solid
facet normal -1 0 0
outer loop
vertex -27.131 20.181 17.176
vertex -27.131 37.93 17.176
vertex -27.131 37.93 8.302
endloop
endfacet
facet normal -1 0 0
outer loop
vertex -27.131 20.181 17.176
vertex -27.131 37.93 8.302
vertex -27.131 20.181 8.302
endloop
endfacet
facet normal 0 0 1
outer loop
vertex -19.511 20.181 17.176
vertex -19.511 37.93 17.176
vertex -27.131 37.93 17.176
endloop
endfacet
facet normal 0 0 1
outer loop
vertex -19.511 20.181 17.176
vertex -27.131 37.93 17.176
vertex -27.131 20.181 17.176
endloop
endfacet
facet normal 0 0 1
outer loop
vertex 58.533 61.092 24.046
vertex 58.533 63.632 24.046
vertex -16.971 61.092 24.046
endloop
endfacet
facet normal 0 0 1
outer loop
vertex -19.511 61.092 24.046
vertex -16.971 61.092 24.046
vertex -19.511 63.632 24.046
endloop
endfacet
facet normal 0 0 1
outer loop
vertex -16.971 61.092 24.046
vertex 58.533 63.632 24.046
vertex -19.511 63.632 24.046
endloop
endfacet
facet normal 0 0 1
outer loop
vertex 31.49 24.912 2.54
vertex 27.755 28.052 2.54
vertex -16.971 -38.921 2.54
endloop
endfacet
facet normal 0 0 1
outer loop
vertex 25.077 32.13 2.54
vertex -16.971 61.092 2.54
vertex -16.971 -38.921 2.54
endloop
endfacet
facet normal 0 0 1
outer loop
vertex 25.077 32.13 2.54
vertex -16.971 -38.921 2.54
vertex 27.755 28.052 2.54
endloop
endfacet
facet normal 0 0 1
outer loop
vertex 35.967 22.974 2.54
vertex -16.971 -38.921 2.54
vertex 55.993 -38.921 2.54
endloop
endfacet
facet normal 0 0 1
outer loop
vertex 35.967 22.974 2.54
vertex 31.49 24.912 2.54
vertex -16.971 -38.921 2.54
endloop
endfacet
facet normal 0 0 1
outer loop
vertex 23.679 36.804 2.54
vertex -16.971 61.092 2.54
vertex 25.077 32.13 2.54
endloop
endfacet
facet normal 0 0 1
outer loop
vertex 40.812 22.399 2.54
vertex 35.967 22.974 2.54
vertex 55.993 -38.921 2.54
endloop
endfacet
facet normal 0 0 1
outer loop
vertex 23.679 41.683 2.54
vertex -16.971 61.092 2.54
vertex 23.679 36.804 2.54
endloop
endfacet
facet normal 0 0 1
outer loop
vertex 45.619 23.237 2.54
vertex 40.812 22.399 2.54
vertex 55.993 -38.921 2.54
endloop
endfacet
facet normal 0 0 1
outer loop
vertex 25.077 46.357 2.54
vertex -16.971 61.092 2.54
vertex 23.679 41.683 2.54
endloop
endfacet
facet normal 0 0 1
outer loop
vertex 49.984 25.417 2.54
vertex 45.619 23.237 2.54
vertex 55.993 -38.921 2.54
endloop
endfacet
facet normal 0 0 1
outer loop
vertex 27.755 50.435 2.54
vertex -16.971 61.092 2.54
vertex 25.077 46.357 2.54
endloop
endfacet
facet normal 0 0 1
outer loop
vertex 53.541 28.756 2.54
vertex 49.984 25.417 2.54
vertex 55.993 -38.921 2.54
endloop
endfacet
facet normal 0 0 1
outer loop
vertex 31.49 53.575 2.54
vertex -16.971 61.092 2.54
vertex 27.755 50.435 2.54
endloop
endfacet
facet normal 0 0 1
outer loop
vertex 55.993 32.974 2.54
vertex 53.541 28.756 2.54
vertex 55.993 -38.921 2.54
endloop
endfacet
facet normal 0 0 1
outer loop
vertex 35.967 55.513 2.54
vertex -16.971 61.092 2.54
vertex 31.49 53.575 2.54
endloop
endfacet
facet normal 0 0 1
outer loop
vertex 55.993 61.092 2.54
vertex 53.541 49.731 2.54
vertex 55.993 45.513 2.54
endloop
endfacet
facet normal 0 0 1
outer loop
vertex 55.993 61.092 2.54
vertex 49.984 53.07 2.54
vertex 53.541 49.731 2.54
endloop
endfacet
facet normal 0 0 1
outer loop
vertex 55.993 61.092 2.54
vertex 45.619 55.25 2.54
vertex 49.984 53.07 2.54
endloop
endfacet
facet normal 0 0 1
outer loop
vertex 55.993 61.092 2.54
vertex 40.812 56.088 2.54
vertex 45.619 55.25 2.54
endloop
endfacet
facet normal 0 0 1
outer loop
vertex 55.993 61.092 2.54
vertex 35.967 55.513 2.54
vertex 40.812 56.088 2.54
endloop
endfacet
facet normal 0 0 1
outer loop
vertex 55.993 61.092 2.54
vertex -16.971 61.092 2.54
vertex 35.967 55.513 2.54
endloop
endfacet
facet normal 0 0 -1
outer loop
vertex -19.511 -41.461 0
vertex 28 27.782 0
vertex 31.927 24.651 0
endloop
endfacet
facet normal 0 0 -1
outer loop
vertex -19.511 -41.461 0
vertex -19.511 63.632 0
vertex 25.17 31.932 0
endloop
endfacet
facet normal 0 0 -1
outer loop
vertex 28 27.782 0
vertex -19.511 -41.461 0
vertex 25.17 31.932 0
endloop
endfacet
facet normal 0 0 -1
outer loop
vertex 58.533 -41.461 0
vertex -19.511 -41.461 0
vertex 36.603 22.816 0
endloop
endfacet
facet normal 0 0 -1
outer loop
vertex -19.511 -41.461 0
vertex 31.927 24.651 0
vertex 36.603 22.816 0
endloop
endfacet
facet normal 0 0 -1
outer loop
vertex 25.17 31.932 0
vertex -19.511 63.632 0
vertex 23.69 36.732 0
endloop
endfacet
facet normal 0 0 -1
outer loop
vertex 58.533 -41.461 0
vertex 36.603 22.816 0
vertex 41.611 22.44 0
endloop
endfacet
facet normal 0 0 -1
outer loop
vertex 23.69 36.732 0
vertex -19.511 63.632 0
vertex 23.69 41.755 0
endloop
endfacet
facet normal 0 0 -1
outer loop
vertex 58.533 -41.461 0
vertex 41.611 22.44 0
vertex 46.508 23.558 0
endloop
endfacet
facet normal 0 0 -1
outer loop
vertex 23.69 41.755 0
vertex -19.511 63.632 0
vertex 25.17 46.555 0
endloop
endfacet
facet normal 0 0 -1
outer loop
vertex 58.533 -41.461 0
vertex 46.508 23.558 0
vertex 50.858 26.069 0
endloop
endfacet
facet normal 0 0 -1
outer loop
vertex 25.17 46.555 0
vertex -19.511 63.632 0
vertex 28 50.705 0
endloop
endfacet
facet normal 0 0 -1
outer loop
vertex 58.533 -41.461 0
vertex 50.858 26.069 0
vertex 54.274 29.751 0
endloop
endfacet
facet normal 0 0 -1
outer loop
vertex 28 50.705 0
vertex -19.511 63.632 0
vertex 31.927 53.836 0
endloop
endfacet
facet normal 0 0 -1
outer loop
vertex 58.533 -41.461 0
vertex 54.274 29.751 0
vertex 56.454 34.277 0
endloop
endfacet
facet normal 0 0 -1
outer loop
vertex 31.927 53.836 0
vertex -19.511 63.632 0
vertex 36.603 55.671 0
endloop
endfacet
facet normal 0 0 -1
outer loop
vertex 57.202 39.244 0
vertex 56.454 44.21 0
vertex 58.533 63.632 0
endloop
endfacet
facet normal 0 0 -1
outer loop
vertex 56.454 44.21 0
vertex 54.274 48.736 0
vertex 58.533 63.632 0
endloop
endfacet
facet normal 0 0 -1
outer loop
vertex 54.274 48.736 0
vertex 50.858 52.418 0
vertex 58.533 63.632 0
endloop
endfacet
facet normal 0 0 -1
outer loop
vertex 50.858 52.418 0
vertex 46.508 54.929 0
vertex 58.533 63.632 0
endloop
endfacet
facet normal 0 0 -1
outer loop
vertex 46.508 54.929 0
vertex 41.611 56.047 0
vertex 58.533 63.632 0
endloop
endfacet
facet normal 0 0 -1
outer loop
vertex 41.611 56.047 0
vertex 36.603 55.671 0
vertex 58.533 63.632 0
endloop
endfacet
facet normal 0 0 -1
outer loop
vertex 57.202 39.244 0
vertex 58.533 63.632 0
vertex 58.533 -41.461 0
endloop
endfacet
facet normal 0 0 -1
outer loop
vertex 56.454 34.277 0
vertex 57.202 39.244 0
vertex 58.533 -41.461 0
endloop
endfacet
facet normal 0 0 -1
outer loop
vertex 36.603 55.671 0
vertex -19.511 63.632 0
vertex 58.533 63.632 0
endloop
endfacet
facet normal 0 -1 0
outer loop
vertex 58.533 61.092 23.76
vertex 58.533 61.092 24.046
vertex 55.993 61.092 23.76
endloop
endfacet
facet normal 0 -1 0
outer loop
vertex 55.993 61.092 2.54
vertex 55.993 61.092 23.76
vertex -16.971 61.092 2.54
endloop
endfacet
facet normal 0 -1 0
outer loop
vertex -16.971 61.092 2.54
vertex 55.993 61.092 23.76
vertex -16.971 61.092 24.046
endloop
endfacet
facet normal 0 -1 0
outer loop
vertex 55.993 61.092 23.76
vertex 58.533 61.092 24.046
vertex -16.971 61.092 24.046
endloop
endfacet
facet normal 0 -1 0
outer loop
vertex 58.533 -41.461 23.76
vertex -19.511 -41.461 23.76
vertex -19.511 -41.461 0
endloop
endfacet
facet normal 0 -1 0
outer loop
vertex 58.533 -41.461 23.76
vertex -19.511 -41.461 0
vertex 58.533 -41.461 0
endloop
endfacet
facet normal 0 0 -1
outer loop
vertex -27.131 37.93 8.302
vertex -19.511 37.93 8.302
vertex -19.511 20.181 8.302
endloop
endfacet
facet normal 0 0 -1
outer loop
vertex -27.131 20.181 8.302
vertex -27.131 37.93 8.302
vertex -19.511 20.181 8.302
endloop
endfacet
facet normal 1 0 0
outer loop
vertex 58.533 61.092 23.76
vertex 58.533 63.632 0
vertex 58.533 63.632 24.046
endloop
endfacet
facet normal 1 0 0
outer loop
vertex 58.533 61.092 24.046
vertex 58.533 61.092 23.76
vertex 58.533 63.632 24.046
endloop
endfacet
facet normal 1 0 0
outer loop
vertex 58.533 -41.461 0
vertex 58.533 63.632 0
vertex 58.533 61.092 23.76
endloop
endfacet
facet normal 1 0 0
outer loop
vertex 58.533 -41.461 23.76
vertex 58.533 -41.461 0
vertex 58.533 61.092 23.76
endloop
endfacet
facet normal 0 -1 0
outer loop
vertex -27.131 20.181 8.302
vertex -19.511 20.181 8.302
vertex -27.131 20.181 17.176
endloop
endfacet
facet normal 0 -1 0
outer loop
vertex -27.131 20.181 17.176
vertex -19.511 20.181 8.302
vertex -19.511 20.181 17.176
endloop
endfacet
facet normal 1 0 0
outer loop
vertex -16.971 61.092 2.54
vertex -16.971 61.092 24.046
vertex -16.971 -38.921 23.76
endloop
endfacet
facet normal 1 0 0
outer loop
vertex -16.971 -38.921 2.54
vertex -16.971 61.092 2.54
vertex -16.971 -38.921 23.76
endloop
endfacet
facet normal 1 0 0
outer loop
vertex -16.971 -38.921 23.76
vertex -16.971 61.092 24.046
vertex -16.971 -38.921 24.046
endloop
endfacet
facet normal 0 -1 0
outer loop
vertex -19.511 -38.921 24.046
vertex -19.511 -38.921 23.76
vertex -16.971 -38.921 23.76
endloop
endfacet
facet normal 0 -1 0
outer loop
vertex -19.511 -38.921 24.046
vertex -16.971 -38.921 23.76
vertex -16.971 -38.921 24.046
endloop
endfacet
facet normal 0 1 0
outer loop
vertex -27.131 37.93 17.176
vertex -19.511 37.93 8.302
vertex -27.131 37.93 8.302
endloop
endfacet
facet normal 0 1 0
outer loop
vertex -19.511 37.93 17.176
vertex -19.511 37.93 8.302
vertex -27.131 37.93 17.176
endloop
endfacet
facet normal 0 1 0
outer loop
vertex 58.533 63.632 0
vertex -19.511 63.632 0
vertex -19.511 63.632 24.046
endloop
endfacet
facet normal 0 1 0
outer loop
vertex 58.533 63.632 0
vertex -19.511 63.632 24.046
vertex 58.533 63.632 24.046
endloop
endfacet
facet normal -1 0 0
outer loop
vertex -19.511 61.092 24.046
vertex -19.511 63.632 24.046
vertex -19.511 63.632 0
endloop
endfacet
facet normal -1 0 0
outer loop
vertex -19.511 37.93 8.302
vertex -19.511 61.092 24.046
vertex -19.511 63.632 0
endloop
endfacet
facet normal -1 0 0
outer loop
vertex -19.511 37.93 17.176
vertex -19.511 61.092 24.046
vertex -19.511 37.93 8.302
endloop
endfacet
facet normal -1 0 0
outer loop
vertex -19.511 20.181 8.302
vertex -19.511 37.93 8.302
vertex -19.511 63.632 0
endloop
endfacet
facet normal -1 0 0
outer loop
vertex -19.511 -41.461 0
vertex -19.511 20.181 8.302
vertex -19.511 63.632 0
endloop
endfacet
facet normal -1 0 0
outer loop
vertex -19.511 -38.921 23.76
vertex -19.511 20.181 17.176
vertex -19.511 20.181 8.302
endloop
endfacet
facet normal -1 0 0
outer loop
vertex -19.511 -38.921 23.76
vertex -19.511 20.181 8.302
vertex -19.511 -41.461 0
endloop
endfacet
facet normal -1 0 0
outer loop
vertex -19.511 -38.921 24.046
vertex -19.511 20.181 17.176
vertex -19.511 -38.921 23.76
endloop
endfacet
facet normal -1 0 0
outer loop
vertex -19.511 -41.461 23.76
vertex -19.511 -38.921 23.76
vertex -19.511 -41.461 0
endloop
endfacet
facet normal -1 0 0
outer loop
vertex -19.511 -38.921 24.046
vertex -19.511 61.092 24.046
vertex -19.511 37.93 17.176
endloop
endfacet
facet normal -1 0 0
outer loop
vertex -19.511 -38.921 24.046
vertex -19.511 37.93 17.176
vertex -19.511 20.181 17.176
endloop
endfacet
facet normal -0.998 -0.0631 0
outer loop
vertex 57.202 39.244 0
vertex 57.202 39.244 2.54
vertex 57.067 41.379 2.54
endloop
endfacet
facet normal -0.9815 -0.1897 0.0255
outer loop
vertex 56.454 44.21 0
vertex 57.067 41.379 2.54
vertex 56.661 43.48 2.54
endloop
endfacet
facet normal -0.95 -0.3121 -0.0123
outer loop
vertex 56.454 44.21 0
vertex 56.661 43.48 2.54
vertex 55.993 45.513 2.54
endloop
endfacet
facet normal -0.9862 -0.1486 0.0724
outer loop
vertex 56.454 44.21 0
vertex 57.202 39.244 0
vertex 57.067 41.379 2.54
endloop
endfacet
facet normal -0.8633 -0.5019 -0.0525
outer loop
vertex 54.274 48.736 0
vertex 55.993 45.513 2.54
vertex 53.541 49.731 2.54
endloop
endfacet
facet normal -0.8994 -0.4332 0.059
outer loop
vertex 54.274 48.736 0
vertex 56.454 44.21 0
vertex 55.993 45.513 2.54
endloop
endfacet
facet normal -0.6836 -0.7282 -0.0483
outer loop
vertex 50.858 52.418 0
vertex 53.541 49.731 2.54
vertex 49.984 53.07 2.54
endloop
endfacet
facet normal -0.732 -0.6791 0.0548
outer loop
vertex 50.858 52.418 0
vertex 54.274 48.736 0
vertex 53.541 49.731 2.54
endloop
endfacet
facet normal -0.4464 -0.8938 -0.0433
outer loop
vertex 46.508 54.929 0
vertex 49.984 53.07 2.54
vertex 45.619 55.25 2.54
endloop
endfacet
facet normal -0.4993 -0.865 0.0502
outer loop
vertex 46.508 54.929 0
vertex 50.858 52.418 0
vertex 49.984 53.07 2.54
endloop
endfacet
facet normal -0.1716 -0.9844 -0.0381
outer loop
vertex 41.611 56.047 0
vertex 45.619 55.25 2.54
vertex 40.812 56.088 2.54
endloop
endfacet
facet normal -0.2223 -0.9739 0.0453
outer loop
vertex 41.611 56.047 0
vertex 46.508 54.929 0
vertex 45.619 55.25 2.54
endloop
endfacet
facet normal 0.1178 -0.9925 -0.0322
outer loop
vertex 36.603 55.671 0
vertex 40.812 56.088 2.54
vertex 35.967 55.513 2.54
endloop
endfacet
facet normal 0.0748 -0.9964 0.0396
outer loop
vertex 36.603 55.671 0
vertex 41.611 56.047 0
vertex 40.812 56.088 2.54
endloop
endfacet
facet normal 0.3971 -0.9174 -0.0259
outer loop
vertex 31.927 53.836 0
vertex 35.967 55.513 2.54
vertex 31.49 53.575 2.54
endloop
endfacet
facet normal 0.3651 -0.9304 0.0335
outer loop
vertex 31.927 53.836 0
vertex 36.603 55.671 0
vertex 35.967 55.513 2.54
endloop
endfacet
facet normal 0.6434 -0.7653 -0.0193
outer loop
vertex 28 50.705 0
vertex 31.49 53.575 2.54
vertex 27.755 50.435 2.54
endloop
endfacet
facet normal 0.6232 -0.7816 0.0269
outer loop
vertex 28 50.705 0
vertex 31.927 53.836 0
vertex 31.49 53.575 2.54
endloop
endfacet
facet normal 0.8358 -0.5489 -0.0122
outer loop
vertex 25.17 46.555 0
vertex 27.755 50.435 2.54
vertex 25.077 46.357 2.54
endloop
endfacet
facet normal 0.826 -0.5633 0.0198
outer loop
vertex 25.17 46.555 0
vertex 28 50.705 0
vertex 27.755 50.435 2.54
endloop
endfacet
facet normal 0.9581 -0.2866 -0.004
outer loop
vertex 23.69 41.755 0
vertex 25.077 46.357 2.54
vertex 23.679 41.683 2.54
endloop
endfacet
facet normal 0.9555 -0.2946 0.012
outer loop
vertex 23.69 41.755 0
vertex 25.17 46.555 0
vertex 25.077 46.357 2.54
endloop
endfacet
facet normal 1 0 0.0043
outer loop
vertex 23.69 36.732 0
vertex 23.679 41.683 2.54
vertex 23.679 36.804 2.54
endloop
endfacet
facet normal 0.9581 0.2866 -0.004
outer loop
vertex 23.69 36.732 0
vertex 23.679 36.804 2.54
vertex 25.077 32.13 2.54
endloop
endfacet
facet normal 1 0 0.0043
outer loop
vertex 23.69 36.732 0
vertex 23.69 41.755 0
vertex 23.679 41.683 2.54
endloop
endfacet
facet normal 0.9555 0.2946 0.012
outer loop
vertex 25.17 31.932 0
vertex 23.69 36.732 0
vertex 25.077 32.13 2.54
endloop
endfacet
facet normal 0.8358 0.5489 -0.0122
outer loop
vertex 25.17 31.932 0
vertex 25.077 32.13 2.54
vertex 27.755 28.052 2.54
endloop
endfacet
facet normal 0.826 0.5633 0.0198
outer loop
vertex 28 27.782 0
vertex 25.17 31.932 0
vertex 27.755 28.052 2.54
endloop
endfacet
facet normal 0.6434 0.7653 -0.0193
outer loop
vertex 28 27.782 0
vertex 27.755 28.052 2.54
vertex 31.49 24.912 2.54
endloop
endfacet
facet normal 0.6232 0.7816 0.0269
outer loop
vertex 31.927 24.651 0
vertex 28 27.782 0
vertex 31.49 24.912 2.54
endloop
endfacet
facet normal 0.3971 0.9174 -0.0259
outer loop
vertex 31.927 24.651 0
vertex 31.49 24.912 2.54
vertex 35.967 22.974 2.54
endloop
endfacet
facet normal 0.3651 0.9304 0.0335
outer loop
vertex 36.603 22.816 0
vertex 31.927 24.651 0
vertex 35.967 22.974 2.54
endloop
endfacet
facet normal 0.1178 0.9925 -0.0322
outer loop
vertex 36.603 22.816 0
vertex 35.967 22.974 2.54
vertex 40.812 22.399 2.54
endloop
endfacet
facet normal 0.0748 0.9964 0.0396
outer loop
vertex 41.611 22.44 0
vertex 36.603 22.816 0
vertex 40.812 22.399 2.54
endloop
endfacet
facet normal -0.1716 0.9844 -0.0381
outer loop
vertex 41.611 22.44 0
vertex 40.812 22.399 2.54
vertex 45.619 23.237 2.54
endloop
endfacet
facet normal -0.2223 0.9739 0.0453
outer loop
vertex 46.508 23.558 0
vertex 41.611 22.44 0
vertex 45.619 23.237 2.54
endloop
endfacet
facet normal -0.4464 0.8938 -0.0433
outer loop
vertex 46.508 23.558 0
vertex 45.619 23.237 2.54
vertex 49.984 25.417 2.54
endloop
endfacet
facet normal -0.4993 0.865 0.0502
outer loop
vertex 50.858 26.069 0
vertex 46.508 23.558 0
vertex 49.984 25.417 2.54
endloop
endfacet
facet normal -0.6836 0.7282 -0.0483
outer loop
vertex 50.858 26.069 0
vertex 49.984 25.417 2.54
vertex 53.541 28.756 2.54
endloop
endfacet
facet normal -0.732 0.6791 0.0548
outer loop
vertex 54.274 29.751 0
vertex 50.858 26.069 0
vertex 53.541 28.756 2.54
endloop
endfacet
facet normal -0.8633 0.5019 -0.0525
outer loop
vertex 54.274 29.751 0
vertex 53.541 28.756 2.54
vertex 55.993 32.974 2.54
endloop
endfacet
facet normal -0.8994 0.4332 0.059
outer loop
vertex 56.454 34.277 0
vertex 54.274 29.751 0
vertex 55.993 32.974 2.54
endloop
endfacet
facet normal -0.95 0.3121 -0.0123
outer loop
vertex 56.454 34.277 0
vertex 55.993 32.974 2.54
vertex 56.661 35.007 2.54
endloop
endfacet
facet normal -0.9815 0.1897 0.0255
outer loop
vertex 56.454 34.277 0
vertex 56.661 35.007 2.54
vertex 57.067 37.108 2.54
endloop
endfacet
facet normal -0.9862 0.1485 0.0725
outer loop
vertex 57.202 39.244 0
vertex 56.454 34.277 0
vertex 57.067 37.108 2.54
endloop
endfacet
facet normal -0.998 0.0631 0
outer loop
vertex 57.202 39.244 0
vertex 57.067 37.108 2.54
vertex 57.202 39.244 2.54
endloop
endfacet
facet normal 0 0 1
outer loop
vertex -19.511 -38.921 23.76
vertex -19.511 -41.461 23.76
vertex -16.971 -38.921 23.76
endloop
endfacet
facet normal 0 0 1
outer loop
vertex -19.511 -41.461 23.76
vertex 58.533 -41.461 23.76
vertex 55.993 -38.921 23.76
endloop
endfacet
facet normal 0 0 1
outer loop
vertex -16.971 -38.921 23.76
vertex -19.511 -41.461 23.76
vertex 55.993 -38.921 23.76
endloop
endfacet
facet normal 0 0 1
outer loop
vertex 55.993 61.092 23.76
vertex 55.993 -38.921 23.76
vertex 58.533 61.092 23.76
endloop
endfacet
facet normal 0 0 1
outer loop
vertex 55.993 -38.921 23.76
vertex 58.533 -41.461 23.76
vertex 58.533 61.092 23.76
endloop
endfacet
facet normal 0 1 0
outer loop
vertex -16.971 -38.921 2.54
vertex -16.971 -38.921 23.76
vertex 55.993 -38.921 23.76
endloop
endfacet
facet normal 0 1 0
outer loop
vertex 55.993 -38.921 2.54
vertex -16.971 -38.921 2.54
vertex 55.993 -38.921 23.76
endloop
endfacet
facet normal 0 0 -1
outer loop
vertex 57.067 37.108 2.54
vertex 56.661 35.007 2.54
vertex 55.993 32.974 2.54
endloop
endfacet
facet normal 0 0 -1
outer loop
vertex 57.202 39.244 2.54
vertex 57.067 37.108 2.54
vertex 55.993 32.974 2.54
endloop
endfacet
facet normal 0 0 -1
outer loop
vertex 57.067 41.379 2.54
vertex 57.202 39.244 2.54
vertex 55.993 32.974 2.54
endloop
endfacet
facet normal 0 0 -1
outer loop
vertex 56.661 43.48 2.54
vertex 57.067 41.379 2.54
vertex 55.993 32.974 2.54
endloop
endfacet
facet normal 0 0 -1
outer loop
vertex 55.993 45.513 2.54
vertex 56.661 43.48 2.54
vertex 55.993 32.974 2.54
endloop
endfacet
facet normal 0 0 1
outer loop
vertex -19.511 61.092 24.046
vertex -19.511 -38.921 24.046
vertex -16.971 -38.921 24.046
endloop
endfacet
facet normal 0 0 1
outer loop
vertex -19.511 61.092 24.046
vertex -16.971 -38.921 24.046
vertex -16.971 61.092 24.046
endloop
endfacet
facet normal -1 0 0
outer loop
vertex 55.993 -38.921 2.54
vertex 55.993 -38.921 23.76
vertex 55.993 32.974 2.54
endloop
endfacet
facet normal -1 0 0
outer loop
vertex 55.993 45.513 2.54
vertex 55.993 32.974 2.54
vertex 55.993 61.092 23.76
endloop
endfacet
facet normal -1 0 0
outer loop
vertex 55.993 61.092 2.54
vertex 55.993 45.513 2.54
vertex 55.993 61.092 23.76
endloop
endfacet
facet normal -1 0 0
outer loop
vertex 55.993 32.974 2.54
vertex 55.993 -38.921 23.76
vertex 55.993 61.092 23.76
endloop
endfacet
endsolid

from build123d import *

# Parameters (mm, degrees)
F0_W      = 78.04359
F0_H      = 105.09279
F0_R      = 16.850319
F1_DEPTH  = 2.54
F2_W      = 78.04359
F2_H      = 21.505939
F3_DEPTH  = 2.54
F4_W      = 78.04359
F4_H      = 21.21968
F5_DEPTH  = 2.54
F7_DEPTH  = 2.54
F8_W      = 100.01279
F8_H      = 21.21968
F9_DEPTH  = 2.54
F10_W     = 17.748192
F10_H     = 8.874096
F11_DEPTH = 7.62


with BuildPart() as f1:
    # F0 (on Top) → F1 (new body)
    with BuildSketch(Plane.XY):
        with Locations((19.510894, 11.085736)):
            Rectangle(F0_W, F0_H)
        with Locations((40.35208, 39.243508)):
            Circle(F0_R, mode=Mode.SUBTRACT)
    extrude(amount=F1_DEPTH)

    # F2 (on face) → F3 (join)
    with BuildSketch(Plane(origin=(0, 63.632131, 0), x_dir=(-1, 0, 0), z_dir=(0, 1, 0))):
        with Locations((-19.510894, 13.292969)):
            Rectangle(F2_W, F2_H)
    extrude(amount=-F3_DEPTH)

    # F4 (on face) → F5 (join)
    with BuildSketch(Plane.XZ.offset(41.460659)):
        with Locations((19.510894, 13.14984)):
            Rectangle(F4_W, F4_H)
    extrude(amount=-F5_DEPTH)

    # F6 (on face) → F7 (join)
    with BuildSketch(Plane(origin=(-19.510901, 0, 0), x_dir=(0, -1, 0), z_dir=(-1, 0, 0))):
        Polygon((38.920659, 24.045939), (-61.092131, 24.045939), (-61.092131, 2.54), (38.920659, 2.54), (38.920659, 23.75968), align=None)
    extrude(amount=-F7_DEPTH)

    # F8 (on face) → F9 (join)
    with BuildSketch(Plane.YZ.offset(58.532689)):
        with Locations((11.085736, 13.14984)):
            Rectangle(F8_W, F8_H)
    extrude(amount=-F9_DEPTH)

    # F10 (on face) → F11 (join)
    with BuildSketch(Plane(origin=(-19.510901, 0, 0), x_dir=(0, -1, 0), z_dir=(-1, 0, 0))):
        with Locations((-29.05551, 12.738623)):
            Rectangle(F10_W, F10_H)
    extrude(amount=F11_DEPTH)


solid = f1.part
